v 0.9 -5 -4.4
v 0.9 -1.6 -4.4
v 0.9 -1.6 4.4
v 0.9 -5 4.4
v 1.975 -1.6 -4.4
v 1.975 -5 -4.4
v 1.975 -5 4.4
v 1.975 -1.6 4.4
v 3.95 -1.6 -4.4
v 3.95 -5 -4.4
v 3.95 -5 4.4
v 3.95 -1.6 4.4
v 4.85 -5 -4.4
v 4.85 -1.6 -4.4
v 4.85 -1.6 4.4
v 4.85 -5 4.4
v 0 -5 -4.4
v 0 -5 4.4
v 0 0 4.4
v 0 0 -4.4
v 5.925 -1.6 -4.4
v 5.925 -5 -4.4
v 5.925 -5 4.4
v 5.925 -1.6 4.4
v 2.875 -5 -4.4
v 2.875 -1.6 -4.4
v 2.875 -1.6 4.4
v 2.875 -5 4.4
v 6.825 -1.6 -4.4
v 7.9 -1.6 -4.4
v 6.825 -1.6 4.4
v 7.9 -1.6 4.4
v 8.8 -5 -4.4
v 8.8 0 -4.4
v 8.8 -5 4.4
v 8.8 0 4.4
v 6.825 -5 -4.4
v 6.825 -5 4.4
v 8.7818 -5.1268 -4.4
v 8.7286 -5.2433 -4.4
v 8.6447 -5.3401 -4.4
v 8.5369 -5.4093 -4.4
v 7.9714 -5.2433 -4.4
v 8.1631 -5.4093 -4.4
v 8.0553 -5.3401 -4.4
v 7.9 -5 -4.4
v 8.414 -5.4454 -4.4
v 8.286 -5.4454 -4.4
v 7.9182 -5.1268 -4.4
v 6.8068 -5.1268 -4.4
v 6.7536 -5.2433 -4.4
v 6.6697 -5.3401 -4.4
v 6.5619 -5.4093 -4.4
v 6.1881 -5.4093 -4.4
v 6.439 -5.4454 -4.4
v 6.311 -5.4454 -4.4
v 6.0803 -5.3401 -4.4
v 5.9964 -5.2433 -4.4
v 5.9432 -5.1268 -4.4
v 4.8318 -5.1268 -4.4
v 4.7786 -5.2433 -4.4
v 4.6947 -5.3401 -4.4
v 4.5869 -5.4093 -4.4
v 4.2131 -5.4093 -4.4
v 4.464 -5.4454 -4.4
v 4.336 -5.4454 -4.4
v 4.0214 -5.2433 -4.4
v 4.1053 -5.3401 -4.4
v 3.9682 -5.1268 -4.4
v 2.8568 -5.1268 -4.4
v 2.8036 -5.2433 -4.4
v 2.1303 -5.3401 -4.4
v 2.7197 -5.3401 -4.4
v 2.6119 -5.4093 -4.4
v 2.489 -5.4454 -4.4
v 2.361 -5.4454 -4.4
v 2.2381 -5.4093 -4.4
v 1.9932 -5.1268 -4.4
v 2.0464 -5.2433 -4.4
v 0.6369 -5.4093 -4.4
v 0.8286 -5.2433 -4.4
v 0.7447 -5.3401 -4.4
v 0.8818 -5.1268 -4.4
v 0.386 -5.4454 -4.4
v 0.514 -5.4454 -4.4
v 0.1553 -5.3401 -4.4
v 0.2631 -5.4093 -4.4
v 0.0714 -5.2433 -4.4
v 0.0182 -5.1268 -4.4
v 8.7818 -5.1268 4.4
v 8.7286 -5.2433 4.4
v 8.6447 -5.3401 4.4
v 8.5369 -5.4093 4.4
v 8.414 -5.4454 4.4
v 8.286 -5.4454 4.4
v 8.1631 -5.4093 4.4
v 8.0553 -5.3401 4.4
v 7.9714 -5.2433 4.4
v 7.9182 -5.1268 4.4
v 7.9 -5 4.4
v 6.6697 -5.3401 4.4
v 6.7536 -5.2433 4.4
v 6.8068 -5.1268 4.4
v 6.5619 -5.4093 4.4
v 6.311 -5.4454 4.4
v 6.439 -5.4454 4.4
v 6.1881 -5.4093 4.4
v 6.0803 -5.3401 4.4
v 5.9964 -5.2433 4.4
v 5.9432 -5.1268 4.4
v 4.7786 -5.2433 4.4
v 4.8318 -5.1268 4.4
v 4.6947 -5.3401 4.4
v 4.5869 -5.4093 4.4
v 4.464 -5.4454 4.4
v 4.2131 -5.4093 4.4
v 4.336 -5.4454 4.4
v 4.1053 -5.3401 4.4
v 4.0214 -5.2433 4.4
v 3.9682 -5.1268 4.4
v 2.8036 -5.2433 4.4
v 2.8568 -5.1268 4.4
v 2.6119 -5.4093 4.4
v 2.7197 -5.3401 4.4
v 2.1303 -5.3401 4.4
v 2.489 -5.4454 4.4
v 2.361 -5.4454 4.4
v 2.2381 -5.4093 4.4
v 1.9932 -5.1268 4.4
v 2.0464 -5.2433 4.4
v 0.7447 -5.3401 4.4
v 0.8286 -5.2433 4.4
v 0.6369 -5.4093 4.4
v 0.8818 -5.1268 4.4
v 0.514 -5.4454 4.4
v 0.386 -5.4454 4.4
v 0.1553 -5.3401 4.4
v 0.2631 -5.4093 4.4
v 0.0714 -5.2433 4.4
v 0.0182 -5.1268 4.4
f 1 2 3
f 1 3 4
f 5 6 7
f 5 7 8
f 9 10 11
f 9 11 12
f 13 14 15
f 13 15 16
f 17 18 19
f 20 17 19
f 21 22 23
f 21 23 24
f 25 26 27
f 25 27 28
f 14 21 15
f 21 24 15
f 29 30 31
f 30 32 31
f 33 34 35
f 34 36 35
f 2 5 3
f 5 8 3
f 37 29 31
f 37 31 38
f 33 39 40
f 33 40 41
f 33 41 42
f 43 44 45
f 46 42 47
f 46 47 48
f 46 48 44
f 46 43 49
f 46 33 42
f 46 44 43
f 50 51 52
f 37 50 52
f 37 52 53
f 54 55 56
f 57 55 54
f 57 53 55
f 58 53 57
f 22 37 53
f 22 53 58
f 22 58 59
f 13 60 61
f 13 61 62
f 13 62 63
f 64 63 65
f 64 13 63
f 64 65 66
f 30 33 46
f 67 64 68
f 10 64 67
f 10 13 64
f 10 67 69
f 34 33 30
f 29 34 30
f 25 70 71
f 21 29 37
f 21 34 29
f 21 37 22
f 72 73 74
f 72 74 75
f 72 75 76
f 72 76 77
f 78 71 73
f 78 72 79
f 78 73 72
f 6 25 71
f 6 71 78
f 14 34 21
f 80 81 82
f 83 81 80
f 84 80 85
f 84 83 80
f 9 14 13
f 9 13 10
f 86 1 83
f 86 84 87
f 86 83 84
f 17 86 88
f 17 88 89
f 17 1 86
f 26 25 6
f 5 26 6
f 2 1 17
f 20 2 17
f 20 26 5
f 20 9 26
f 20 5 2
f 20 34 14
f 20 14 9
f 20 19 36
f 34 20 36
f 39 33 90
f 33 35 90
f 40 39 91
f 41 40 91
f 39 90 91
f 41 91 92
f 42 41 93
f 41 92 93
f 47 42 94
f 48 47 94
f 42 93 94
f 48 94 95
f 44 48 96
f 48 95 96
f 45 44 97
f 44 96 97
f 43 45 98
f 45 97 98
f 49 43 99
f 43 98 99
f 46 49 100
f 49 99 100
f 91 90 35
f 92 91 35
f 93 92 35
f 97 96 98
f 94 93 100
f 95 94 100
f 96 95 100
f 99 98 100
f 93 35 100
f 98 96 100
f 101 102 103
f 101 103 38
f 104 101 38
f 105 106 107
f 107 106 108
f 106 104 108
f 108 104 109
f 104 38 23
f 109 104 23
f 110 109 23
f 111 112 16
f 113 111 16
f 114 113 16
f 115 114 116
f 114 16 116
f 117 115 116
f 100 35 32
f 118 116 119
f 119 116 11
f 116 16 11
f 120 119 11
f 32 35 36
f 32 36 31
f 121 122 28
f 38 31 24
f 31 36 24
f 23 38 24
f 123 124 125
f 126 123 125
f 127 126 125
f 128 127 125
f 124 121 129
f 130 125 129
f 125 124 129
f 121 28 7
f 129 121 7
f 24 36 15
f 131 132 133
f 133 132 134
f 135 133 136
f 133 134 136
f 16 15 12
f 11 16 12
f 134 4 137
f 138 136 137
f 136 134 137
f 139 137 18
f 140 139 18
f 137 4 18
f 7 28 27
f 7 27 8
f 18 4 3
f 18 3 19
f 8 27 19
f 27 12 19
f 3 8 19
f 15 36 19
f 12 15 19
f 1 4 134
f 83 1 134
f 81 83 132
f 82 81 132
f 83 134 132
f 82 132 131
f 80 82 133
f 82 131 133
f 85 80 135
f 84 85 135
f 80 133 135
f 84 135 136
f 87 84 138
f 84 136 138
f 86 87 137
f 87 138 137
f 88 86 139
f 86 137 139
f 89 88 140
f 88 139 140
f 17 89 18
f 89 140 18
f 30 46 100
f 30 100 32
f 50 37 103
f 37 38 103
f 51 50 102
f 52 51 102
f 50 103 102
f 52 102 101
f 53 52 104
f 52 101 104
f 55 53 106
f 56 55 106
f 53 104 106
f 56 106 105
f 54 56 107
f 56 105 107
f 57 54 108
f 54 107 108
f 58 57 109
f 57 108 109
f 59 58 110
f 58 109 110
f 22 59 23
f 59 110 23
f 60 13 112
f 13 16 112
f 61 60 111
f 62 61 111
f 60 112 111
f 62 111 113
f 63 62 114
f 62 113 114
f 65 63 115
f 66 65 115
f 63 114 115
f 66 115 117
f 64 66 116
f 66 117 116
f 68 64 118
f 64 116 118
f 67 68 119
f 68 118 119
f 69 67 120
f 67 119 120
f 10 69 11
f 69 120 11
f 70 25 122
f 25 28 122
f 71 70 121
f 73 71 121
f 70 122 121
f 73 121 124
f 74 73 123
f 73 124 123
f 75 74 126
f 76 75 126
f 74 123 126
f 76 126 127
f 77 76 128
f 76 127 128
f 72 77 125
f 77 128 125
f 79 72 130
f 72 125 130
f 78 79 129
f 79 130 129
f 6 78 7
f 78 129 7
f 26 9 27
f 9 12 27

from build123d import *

# Parameters (mm, degrees)
RESSALTO_EXTRUS_O1_DEPTH = 4.4


with BuildPart() as part:
    # Esboço1 → Ressalto-extrusão1 (new body, symmetric)
    with BuildSketch(Plane.XY):
        with BuildLine():
            Line((0, 0), (8.8, 0))
            Line((8.8, 0), (8.8, -5))
            ThreePointArc((8.8, -5), (8.35, -5.45), (7.9, -5))
            Line((7.9, -5), (7.9, -1.6))
            Line((7.9, -1.6), (6.825, -1.6))
            Line((6.825, -1.6), (6.825, -5))
            ThreePointArc((6.825, -5), (6.375, -5.45), (5.925, -5))
            Line((5.925, -5), (5.925, -1.6))
            Line((5.925, -1.6), (4.85, -1.6))
            Line((4.85, -1.6), (4.85, -5))
            ThreePointArc((4.85, -5), (4.4, -5.45), (3.95, -5))
            Line((3.95, -5), (3.95, -1.6))
            Line((3.95, -1.6), (2.875, -1.6))
            Line((2.875, -1.6), (2.875, -5))
            ThreePointArc((2.875, -5), (2.425, -5.45), (1.975, -5))
            Line((1.975, -5), (1.975, -1.6))
            Line((1.975, -1.6), (0.9, -1.6))
            Line((0.9, -1.6), (0.9, -5))
            ThreePointArc((0.9, -5), (0.45, -5.45), (0, -5))
            Line((0, -5), (0, 0))
        make_face()
    extrude(amount=RESSALTO_EXTRUS_O1_DEPTH, both=True)


solid = part.part
